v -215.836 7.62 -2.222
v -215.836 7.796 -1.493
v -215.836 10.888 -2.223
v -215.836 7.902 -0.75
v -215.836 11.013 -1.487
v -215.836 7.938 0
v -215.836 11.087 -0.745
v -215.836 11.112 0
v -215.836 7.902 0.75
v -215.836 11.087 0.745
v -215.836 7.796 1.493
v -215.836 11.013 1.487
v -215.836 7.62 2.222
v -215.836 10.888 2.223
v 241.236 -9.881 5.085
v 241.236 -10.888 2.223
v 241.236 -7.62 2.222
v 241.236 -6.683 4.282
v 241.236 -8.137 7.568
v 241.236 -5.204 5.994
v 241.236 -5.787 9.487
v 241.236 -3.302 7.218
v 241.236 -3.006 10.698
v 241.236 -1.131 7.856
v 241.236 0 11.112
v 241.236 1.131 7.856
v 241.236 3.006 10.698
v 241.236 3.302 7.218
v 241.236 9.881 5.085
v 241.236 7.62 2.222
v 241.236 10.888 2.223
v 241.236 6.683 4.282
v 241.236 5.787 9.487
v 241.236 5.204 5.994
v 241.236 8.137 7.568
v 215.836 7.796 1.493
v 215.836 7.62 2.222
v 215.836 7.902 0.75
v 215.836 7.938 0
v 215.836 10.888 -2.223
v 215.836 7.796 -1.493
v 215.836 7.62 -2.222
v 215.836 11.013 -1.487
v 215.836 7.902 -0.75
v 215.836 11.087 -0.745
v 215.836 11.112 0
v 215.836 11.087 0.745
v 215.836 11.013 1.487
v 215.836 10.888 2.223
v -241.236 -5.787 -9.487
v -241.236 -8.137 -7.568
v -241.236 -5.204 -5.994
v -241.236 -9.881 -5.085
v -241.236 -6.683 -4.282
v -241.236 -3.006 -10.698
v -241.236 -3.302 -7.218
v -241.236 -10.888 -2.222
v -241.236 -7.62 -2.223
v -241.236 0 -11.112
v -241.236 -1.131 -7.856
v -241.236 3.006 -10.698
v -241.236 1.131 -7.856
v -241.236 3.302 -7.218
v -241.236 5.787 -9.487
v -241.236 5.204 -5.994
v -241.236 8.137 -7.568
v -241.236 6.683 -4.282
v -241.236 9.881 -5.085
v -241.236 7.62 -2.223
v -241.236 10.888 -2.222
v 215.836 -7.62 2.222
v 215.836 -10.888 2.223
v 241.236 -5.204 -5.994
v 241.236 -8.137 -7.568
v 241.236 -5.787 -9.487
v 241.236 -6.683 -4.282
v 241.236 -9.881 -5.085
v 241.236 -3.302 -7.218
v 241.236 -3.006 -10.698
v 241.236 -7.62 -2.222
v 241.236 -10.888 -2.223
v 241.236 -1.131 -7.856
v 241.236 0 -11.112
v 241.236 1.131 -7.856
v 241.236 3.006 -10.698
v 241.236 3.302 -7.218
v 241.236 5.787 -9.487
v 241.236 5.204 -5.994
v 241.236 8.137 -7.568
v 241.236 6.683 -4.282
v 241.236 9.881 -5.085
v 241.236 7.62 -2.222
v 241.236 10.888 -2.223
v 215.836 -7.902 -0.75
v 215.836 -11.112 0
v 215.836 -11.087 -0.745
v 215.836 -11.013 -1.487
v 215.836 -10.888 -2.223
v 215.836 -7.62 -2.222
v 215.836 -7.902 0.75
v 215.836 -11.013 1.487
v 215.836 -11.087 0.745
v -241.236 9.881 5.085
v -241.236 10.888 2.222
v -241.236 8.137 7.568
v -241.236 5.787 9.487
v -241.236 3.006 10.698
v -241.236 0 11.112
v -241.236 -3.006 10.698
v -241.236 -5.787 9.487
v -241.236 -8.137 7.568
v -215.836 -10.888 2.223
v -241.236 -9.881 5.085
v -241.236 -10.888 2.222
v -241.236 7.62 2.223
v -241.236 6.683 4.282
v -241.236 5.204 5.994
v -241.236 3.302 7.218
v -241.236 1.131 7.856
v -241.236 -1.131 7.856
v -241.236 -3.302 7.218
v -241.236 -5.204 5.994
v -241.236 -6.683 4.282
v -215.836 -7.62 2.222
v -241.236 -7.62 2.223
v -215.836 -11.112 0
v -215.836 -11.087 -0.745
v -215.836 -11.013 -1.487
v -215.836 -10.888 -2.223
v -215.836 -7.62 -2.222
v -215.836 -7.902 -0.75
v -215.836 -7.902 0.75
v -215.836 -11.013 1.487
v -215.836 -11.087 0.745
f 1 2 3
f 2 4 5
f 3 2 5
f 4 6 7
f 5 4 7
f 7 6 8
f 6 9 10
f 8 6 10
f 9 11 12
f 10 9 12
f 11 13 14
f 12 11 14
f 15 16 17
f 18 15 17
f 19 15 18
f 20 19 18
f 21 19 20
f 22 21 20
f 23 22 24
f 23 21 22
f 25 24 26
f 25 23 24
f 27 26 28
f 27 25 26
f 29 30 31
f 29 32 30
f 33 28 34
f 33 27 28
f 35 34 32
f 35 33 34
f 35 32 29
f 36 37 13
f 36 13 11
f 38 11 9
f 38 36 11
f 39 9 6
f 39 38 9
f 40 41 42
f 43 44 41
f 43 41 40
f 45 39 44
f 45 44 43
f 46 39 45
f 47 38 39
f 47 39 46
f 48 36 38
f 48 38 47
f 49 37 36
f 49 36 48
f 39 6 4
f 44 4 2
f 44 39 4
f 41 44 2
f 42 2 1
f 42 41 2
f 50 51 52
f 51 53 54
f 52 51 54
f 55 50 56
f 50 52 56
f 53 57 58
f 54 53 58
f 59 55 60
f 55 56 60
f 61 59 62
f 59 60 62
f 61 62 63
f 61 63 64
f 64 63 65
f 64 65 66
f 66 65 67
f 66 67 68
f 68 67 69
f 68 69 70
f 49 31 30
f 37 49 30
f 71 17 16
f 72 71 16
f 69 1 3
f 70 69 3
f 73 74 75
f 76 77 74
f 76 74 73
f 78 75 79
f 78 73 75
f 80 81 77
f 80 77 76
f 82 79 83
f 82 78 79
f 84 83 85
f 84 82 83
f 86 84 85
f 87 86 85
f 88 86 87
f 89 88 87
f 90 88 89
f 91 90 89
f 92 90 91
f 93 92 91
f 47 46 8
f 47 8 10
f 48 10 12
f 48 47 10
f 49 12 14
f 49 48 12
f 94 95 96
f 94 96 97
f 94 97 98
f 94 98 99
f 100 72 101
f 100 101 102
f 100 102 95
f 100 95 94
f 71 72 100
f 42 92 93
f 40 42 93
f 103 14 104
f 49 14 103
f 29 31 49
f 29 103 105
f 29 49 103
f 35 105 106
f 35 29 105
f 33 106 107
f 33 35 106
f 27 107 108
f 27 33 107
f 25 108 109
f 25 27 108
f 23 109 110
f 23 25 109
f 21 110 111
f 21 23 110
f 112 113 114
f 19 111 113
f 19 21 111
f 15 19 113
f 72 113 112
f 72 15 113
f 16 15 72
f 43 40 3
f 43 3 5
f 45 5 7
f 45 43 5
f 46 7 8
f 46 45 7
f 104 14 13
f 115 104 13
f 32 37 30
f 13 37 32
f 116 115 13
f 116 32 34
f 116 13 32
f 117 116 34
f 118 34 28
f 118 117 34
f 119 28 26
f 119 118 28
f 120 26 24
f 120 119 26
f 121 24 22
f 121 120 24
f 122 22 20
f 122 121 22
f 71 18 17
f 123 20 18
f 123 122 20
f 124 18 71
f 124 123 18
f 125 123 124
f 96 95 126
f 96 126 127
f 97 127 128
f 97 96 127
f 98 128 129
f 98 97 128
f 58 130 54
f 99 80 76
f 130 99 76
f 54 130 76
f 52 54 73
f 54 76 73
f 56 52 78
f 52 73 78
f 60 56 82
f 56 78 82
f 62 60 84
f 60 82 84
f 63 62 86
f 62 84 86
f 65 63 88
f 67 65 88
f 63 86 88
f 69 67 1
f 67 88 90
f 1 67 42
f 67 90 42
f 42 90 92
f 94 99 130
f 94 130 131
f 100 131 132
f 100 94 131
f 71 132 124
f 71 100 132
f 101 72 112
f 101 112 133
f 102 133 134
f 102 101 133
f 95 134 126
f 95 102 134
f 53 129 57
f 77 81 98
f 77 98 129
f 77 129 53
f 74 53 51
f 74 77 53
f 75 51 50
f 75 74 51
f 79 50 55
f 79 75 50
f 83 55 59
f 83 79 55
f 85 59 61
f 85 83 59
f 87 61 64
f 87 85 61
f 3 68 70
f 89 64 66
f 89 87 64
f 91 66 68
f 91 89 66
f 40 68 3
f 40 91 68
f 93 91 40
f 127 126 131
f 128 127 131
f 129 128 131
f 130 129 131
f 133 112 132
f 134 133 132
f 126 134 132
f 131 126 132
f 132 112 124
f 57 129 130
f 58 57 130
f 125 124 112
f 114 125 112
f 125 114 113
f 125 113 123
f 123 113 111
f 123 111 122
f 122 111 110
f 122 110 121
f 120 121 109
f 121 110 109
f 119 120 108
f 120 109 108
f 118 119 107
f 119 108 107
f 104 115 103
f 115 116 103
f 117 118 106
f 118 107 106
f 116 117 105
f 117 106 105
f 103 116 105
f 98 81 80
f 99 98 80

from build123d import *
from build123d import SkipClean  # not in build123d's __all__

# Parameters (mm, degrees)
F0_R          = 11.1125
F0_R_2        = 7.9375
F1_DEPTH      = 241.2365
F1_DEPTH_BACK = 241.2365
F3_DEPTH      = 482.474
F4_DEPTH      = 457.073
F5_DEPTH      = 25.4


with BuildPart() as f1:
    # F0 (on Right) → F1 (new body, two sides)
    with BuildSketch(Plane.YZ) as f1_sk:
        Circle(F0_R)
        Circle(F0_R_2, mode=Mode.SUBTRACT)
    extrude(amount=F1_DEPTH)
    extrude(f1_sk.sketch, amount=-F1_DEPTH_BACK)

    # F2 (on face) → F3 (cut, through all)
    with BuildSketch(Plane.YZ.offset(241.2365)):
        with BuildLine():
            Line((-7.62, 2.2225), (-10.8879819067, 2.2225))
            ThreePointArc((-10.8879819067, 2.2225), (-11.0562280003, 1.1169058403), (-11.1125, 0))
            ThreePointArc((-11.1125, 0), (-11.0562280003, -1.1169058403), (-10.8879819067, -2.2225))
            Line((-10.8879819067, -2.2225), (-7.62, -2.2225))
            ThreePointArc((-7.62, -2.2225), (-7.9375, 0), (-7.62, 2.2225))
        make_face()
        with BuildLine():
            ThreePointArc((11.1125, 0), (11.0562280003, 1.1169058403), (10.8879819067, 2.2225))
            Line((10.8879819067, 2.2225), (7.62, 2.2225))
            ThreePointArc((7.62, 2.2225), (7.8577241059, 1.1225320151), (7.9375, 0))
            ThreePointArc((7.9375, 0), (7.8577241059, -1.1225320151), (7.62, -2.2225))
            Line((7.62, -2.2225), (10.8879819067, -2.2225))
            ThreePointArc((10.8879819067, -2.2225), (11.0562280003, -1.1169058403), (11.1125, 0))
        make_face()
    extrude(amount=-F3_DEPTH, mode=Mode.SUBTRACT)

    # F2 (on face) → F4 (join)
    with BuildSketch(Plane.YZ.offset(241.2365)):
        with BuildLine():
            Line((-7.62, 2.2225), (-10.8879819067, 2.2225))
            ThreePointArc((-10.8879819067, 2.2225), (-11.0562280003, 1.1169058403), (-11.1125, 0))
            ThreePointArc((-11.1125, 0), (-11.0562280003, -1.1169058403), (-10.8879819067, -2.2225))
            Line((-10.8879819067, -2.2225), (-7.62, -2.2225))
            ThreePointArc((-7.62, -2.2225), (-7.9375, 0), (-7.62, 2.2225))
        make_face()
        with BuildLine():
            ThreePointArc((11.1125, 0), (11.0562280003, 1.1169058403), (10.8879819067, 2.2225))
            Line((10.8879819067, 2.2225), (7.62, 2.2225))
            ThreePointArc((7.62, 2.2225), (7.8577241059, 1.1225320151), (7.9375, 0))
            ThreePointArc((7.9375, 0), (7.8577241059, -1.1225320151), (7.62, -2.2225))
            Line((7.62, -2.2225), (10.8879819067, -2.2225))
            ThreePointArc((10.8879819067, -2.2225), (11.0562280003, -1.1169058403), (11.1125, 0))
        make_face()
    with SkipClean():  # cleaning this boolean's faces spoils the solid; the shape is the same uncleaned
        extrude(amount=-F4_DEPTH)

    # F2 (on face) → F5 (cut)
    with BuildSketch(Plane.YZ.offset(241.2365)):
        with BuildLine():
            Line((-7.62, 2.2225), (-10.8879819067, 2.2225))
            ThreePointArc((-10.8879819067, 2.2225), (-11.0562280003, 1.1169058403), (-11.1125, 0))
            ThreePointArc((-11.1125, 0), (-11.0562280003, -1.1169058403), (-10.8879819067, -2.2225))
            Line((-10.8879819067, -2.2225), (-7.62, -2.2225))
            ThreePointArc((-7.62, -2.2225), (-7.9375, 0), (-7.62, 2.2225))
        make_face()
        with BuildLine():
            ThreePointArc((11.1125, 0), (11.0562280003, 1.1169058403), (10.8879819067, 2.2225))
            Line((10.8879819067, 2.2225), (7.62, 2.2225))
            ThreePointArc((7.62, 2.2225), (7.8577241059, 1.1225320151), (7.9375, 0))
            ThreePointArc((7.9375, 0), (7.8577241059, -1.1225320151), (7.62, -2.2225))
            Line((7.62, -2.2225), (10.8879819067, -2.2225))
            ThreePointArc((10.8879819067, -2.2225), (11.0562280003, -1.1169058403), (11.1125, 0))
        make_face()
    with SkipClean():  # cleaning this boolean's faces spoils the solid; the shape is the same uncleaned
        extrude(amount=-F5_DEPTH, mode=Mode.SUBTRACT)


solid = f1.part
